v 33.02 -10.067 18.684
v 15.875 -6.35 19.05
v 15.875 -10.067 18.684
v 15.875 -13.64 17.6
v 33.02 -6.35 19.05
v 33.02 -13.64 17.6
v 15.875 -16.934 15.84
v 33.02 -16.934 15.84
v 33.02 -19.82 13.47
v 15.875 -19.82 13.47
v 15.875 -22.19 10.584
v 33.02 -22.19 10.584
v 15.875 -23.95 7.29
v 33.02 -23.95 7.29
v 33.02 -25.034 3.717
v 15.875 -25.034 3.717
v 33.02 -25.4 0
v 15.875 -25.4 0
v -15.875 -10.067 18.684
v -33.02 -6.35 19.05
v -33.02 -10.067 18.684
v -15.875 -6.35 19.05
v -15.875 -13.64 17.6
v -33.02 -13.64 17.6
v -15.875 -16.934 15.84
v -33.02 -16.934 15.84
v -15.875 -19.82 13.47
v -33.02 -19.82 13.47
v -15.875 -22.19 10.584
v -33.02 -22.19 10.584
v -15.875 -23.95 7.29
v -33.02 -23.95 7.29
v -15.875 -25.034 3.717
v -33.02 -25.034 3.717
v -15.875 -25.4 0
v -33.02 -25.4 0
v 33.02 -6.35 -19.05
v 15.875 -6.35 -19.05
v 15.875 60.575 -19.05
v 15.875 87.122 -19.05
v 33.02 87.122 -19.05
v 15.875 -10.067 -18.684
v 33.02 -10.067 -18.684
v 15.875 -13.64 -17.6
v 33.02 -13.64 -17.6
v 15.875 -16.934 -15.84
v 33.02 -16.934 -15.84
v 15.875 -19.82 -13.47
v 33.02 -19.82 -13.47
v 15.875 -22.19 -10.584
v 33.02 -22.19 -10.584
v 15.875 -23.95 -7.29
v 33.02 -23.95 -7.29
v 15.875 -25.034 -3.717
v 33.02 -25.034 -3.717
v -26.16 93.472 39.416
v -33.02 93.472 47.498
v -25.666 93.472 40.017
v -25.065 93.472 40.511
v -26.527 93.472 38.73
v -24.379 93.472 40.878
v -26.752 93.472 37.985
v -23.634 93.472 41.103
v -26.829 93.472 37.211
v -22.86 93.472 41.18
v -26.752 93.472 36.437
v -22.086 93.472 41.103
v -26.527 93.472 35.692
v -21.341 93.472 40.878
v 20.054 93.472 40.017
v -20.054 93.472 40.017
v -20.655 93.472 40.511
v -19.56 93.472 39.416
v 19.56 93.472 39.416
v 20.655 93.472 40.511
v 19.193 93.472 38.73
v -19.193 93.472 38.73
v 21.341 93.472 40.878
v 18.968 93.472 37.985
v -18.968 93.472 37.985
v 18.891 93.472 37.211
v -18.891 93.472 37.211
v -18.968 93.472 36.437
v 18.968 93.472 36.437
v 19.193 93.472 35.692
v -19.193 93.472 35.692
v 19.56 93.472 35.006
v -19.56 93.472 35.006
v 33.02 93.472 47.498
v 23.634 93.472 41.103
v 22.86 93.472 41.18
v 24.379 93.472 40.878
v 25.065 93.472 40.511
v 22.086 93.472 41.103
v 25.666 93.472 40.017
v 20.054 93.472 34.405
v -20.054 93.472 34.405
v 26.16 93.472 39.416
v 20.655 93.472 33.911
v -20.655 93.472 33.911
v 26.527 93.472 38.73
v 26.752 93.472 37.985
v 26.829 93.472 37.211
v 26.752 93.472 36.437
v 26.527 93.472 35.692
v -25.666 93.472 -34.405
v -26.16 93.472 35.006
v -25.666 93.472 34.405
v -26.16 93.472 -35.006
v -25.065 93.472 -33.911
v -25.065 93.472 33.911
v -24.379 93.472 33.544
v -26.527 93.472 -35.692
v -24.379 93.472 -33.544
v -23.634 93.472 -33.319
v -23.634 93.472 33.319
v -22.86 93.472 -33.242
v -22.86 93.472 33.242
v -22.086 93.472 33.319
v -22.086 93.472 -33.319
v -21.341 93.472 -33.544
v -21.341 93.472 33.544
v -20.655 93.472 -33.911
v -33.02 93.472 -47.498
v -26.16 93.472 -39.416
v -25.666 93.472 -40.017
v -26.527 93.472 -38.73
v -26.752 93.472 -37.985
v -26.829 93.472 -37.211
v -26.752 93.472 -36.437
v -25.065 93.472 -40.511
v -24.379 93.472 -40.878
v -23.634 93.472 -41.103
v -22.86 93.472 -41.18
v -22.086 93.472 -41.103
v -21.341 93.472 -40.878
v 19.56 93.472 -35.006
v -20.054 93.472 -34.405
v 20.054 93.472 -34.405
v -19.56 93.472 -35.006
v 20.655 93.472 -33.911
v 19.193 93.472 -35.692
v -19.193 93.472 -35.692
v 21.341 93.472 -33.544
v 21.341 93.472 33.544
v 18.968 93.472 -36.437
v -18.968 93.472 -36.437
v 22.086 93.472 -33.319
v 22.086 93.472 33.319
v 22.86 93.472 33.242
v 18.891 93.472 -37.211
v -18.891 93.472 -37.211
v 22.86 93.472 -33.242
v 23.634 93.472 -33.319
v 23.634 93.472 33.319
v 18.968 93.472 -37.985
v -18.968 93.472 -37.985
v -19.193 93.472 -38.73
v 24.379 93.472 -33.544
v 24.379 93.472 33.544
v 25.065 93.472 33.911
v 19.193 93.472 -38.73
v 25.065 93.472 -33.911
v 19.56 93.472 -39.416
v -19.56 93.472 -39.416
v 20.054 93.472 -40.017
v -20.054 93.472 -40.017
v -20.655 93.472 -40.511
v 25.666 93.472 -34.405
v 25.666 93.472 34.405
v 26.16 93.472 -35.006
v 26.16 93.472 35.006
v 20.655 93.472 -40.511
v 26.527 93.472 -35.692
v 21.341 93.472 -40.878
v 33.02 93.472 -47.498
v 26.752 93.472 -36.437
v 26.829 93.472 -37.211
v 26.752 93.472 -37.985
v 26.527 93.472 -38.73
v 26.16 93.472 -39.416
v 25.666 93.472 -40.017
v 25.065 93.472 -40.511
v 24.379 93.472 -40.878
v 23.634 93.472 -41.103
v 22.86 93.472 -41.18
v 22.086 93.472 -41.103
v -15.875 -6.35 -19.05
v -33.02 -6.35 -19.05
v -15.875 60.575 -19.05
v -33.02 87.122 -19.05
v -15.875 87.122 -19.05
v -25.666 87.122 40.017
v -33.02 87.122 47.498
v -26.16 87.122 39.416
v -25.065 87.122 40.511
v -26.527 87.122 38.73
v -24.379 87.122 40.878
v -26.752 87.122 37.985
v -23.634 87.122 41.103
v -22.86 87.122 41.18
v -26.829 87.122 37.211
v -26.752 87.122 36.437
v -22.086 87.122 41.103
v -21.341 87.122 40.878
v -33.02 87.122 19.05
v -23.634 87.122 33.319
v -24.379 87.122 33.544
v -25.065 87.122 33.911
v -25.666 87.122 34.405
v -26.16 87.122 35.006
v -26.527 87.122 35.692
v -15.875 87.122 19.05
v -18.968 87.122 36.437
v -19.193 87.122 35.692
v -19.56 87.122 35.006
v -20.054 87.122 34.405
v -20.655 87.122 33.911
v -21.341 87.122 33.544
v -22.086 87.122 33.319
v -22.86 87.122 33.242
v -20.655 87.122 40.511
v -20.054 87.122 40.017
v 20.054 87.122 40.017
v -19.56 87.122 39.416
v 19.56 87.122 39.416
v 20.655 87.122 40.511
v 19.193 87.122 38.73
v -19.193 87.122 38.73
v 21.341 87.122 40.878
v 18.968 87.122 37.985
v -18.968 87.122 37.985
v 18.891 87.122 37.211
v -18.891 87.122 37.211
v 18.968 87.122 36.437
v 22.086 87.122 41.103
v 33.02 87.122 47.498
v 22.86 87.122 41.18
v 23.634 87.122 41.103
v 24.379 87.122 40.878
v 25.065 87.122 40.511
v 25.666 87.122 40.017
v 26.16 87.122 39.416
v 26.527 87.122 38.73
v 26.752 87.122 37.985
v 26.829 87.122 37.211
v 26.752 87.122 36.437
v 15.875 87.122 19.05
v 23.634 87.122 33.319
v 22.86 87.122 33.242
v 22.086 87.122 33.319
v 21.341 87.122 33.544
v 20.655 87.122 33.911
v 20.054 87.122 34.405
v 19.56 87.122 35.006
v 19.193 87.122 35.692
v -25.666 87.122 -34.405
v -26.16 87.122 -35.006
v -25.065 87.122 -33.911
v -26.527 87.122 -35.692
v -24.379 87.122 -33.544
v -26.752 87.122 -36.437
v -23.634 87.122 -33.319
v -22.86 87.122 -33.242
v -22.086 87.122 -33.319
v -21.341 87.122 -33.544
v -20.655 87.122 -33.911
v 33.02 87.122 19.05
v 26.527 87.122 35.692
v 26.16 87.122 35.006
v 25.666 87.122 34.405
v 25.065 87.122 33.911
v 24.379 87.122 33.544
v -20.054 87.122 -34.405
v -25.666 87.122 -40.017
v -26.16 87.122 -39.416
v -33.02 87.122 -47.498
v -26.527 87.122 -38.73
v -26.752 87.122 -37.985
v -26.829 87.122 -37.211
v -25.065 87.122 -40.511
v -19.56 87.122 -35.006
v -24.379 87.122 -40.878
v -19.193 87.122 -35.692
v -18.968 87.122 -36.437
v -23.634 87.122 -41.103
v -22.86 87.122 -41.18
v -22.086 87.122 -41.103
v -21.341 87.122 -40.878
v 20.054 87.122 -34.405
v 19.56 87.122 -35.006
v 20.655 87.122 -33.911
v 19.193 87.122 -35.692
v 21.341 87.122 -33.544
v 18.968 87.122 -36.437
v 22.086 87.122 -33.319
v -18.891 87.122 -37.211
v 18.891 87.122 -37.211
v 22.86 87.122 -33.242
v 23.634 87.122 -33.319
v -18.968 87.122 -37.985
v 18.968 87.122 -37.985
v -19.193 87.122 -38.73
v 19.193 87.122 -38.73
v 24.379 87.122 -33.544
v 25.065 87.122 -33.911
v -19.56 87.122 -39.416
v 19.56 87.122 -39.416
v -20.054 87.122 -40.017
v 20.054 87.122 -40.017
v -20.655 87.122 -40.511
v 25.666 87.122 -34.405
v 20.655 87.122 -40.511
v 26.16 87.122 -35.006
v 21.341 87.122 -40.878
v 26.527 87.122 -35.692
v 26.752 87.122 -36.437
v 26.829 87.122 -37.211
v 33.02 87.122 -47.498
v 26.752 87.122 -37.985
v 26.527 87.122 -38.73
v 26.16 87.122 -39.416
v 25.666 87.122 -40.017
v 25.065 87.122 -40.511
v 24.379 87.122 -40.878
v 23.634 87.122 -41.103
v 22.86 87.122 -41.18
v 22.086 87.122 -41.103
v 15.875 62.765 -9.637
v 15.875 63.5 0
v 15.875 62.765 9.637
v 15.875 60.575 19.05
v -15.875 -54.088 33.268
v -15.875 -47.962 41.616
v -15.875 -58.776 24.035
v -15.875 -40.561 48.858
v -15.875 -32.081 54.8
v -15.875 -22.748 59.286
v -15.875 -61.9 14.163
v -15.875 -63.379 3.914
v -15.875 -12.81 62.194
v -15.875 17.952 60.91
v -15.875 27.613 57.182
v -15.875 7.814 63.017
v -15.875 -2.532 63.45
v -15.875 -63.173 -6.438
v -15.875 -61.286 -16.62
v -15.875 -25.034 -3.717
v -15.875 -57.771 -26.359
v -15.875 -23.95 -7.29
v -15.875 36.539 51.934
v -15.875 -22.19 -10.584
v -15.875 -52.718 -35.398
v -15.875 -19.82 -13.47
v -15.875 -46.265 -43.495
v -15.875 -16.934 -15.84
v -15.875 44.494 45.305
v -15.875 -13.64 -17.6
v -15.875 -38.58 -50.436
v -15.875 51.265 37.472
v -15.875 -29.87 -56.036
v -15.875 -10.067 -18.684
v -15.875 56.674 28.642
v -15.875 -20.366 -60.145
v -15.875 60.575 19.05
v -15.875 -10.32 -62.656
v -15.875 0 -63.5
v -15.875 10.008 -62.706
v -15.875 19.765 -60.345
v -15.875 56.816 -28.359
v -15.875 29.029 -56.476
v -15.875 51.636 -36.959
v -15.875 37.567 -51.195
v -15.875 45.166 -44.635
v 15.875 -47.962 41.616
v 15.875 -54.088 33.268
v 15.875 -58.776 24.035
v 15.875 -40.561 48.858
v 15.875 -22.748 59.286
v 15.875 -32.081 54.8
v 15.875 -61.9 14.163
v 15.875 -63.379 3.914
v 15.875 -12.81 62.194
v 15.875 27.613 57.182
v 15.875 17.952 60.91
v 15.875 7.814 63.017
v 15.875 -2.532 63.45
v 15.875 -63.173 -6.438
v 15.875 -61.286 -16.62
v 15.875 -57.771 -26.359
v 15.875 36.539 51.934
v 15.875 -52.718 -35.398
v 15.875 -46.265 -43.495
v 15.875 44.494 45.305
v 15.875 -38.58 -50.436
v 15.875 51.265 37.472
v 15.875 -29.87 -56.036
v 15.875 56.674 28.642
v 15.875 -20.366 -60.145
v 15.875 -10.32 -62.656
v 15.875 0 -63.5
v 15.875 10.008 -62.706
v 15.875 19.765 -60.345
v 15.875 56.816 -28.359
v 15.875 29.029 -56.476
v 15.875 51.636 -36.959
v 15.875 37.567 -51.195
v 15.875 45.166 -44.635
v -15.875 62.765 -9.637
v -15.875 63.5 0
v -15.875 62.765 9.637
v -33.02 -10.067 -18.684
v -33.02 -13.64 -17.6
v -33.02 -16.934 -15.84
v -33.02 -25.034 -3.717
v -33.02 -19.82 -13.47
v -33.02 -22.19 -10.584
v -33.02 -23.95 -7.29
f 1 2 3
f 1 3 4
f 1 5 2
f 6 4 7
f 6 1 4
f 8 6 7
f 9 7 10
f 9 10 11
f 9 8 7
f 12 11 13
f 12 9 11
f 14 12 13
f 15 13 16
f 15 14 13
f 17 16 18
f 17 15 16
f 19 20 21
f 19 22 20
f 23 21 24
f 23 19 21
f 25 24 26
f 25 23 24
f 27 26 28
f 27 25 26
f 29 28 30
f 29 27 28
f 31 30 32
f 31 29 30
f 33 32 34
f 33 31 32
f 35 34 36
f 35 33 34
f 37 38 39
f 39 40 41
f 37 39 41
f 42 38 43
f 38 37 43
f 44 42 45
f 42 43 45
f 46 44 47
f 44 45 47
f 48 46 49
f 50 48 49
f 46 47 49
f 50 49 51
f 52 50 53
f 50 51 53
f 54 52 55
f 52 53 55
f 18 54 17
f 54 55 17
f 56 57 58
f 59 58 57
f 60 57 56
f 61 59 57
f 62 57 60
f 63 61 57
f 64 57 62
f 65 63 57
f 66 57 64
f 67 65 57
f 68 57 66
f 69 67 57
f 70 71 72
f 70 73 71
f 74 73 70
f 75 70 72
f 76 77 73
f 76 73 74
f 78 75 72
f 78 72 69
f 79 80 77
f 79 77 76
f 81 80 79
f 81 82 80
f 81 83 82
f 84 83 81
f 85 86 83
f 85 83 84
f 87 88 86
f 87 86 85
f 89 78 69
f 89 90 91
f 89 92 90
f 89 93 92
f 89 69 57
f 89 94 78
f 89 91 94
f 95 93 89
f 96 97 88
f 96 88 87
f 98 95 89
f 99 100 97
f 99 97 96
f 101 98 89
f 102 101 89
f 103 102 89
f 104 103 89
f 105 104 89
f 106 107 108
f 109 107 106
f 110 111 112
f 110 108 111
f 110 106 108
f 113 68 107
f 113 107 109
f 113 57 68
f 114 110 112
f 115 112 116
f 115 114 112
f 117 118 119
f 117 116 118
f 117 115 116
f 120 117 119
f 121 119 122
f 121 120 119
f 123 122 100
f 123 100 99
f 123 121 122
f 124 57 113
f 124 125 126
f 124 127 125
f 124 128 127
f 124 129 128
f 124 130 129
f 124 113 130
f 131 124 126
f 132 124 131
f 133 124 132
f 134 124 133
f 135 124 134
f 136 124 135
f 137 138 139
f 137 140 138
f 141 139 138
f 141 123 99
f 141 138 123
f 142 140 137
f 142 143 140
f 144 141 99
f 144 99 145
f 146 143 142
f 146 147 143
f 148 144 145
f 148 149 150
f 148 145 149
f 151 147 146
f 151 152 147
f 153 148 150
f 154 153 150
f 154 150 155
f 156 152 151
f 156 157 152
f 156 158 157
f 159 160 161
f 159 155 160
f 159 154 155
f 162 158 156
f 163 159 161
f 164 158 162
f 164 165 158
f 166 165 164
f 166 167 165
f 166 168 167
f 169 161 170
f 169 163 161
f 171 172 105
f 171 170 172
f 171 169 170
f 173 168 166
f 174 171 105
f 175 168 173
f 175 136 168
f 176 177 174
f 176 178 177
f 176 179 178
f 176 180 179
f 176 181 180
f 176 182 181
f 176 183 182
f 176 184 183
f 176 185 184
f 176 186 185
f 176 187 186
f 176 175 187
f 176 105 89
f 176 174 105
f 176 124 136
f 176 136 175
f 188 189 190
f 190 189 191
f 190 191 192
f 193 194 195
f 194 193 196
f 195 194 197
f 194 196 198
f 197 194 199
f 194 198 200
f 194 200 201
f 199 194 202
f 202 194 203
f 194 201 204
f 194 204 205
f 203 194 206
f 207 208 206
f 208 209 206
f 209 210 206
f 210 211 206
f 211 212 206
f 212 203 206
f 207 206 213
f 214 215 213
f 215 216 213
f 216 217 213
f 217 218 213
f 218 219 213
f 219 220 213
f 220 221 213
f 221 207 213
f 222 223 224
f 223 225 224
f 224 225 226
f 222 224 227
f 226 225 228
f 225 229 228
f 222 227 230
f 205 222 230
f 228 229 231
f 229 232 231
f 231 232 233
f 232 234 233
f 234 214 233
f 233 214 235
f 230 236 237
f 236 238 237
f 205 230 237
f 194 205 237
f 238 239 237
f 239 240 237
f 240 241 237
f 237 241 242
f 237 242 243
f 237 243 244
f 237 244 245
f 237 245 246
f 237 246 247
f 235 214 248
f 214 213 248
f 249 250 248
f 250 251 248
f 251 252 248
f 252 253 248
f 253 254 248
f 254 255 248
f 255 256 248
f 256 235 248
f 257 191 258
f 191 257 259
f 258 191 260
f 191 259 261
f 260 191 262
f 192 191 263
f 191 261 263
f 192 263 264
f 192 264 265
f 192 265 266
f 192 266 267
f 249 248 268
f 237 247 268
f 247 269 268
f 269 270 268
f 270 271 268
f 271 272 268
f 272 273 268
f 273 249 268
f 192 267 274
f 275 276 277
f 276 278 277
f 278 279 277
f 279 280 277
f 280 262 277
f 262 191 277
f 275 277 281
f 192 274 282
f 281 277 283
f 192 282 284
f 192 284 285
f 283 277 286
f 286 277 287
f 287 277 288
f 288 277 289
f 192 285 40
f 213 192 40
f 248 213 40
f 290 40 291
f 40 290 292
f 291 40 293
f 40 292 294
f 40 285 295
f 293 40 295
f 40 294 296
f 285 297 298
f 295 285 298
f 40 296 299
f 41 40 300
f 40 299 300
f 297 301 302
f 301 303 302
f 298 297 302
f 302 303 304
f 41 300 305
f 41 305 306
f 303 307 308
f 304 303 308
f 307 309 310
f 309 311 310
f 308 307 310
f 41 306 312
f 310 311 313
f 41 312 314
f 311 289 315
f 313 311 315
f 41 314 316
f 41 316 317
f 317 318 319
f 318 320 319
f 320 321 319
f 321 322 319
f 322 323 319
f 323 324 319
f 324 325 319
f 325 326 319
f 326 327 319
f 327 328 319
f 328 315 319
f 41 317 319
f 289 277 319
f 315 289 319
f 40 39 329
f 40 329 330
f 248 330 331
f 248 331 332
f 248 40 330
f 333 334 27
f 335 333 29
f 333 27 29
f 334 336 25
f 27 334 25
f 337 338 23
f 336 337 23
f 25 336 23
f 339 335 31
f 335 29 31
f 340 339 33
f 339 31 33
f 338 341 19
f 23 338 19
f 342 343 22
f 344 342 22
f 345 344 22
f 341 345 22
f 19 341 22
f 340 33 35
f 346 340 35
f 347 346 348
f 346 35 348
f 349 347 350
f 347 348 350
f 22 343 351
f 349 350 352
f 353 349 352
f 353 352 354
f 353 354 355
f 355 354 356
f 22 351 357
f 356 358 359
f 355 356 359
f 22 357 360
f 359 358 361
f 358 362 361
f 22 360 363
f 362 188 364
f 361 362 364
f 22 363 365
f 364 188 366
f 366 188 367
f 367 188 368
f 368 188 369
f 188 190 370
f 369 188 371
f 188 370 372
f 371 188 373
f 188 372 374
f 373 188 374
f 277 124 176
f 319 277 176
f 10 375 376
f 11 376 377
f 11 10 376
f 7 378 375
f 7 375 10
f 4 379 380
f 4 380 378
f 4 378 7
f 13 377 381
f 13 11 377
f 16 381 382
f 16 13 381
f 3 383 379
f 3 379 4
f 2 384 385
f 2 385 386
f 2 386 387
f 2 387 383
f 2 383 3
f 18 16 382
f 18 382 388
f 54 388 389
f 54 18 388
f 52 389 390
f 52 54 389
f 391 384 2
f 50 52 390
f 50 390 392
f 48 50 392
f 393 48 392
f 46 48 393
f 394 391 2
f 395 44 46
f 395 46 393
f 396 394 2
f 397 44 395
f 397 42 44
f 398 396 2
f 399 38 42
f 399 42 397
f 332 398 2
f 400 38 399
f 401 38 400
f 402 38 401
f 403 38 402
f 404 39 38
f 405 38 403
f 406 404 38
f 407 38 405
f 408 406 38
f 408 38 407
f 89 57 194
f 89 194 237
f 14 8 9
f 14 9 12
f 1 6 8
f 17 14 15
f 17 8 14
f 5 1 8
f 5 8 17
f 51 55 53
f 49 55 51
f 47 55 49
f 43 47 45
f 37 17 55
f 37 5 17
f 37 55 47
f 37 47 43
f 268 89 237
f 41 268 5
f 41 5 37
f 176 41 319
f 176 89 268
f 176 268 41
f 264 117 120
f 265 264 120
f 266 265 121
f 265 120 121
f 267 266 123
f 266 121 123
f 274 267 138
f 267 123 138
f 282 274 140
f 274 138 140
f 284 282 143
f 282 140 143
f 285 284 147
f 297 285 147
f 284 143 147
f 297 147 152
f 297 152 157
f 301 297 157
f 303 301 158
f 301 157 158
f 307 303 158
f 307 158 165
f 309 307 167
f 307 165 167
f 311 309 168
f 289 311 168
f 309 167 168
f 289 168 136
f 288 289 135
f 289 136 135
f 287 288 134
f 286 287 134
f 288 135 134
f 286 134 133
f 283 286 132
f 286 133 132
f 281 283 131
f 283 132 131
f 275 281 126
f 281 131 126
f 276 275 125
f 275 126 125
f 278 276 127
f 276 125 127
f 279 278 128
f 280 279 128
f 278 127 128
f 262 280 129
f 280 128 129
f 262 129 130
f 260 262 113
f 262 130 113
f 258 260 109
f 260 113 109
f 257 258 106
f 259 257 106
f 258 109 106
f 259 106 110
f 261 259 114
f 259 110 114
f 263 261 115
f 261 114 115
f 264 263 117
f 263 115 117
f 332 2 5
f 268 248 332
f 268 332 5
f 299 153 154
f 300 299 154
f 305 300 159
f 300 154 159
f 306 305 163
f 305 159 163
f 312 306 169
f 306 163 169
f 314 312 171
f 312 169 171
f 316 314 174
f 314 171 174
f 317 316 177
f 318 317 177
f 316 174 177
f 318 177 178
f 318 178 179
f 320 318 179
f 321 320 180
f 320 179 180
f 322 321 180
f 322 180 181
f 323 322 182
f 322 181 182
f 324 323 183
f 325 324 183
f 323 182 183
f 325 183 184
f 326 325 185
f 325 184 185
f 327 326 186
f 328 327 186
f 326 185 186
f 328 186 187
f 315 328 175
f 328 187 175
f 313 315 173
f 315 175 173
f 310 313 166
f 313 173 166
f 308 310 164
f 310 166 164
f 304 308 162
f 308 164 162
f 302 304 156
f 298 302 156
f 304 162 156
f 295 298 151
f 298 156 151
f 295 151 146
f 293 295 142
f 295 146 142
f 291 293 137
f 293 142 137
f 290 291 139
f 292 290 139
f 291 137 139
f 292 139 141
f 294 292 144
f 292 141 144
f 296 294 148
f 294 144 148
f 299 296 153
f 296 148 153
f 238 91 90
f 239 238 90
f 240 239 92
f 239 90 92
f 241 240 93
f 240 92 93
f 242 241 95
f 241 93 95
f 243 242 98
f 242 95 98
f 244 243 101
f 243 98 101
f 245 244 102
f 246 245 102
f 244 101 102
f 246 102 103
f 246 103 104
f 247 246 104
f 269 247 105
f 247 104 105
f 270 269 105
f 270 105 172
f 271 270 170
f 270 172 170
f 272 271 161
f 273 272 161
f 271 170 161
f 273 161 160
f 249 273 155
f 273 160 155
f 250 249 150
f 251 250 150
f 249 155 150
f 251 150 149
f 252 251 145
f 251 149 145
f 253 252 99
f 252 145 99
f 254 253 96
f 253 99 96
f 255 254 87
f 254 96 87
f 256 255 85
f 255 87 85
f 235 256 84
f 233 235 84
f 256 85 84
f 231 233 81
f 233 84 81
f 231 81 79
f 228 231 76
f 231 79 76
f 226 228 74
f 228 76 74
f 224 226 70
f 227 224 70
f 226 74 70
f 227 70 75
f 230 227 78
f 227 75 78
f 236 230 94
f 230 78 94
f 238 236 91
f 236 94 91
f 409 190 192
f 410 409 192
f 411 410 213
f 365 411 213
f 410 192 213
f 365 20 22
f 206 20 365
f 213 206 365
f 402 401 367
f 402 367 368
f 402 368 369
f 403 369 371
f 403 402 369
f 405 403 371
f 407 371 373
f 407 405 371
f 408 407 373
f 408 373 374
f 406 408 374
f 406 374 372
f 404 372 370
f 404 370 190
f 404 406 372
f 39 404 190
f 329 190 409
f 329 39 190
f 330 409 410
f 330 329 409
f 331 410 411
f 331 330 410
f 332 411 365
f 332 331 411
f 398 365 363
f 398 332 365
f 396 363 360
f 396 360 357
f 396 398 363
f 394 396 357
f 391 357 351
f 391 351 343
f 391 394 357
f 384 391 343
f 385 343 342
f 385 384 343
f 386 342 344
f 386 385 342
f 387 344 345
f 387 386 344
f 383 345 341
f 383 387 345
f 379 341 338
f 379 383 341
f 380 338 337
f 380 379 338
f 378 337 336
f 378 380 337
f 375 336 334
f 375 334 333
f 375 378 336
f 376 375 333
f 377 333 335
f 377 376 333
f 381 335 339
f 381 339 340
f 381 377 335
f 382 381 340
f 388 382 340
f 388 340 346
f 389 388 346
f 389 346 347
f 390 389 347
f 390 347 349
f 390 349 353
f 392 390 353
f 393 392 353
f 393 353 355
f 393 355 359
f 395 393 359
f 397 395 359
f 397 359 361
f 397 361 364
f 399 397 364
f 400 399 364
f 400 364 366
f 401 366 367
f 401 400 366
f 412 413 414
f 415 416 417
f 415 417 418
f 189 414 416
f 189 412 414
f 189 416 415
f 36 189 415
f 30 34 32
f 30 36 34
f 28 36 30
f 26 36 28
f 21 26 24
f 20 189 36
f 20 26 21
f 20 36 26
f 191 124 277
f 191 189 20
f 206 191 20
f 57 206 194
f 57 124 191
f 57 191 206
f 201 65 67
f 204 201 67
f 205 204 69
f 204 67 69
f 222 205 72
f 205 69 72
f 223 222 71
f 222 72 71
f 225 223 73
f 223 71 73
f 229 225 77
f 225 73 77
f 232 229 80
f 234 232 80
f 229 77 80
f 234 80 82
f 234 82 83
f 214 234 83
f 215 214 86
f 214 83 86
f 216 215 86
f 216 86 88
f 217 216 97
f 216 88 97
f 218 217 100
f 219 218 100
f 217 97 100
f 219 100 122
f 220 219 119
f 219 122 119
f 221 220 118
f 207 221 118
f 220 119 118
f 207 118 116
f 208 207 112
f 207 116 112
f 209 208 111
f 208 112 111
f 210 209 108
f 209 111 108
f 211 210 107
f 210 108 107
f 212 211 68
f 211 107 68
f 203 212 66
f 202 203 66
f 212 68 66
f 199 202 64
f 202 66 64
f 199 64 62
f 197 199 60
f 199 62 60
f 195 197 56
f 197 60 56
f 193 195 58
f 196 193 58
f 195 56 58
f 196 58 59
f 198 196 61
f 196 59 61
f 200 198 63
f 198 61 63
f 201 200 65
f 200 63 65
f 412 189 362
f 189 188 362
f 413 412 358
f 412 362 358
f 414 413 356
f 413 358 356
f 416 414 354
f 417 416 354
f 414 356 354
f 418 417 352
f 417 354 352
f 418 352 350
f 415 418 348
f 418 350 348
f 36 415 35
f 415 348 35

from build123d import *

# Parameters (mm, degrees)
SKETCH1_R           = 63.5
BOSS_EXTRUDE1_DEPTH = 15.875
BOSS_EXTRUDE2_START = 93.472
SKETCH2_W           = 66.04
SKETCH2_H           = 94.996
SKETCH2_R           = 3.96875
BOSS_EXTRUDE2_DEPTH = 6.35
SKETCH3_W           = 17.145
SKETCH3_H           = 38.1
BOSS_EXTRUDE3_DEPTH = 112.522
FILLET1_R           = 19.05


with BuildPart() as part:
    # Sketch1 → Boss-Extrude1 (new, symmetric)
    with BuildSketch(Plane(origin=(0, 0, 0), x_dir=(0, 0, -1), z_dir=(1, 0, 0))):
        Circle(SKETCH1_R)
    extrude(amount=BOSS_EXTRUDE1_DEPTH, both=True)



with BuildPart() as body_2:
    # Sketch2 → Boss-Extrude2 (new body)
    with BuildSketch(Plane(origin=(0, 0, 0), x_dir=(1, 0, 0), z_dir=(0, 1, 0)).offset(BOSS_EXTRUDE2_START)):
        Rectangle(SKETCH2_W, SKETCH2_H)
        with Locations(Location((-22.86, 37.211, 0), (0, 0, 270))):
            Circle(SKETCH2_R, mode=Mode.SUBTRACT)
        with Locations(Location((22.86, 37.211, 0), (0, 0, 270))):
            Circle(SKETCH2_R, mode=Mode.SUBTRACT)
        with Locations(Location((22.86, -37.211, 0), (0, 0, 270))):
            Circle(SKETCH2_R, mode=Mode.SUBTRACT)
        with Locations(Location((-22.86, -37.211, 0), (0, 0, 270))):
            Circle(SKETCH2_R, mode=Mode.SUBTRACT)
    extrude(amount=-BOSS_EXTRUDE2_DEPTH)


with BuildPart() as part_1:
    add(part.part)

    add(body_2.part)  # Boss-Extrude3 merges body 2
    # Sketch3 → Boss-Extrude3 (add)
    with BuildSketch(Plane.XZ.offset(-87.122)):
        with Locations((-24.4475, 0)):
            Rectangle(SKETCH3_W, SKETCH3_H)
        with Locations((24.4475, 0)):
            Rectangle(SKETCH3_W, SKETCH3_H)
    extrude(amount=BOSS_EXTRUDE3_DEPTH)

    # Fillet1
    fillet1_edges = [part_1.edges().sort_by_distance(p)[0] for p in [
        (-24.4475, -25.4, -19.05),
        (-24.4475, -25.4, 19.05),
        (24.4475, -25.4, 19.05),
        (24.4475, -25.4, -19.05),
    ]]
    fillet(fillet1_edges, radius=FILLET1_R - 0.0001)  # a hair under: the kernel refuses the full size


solid = part_1.part
